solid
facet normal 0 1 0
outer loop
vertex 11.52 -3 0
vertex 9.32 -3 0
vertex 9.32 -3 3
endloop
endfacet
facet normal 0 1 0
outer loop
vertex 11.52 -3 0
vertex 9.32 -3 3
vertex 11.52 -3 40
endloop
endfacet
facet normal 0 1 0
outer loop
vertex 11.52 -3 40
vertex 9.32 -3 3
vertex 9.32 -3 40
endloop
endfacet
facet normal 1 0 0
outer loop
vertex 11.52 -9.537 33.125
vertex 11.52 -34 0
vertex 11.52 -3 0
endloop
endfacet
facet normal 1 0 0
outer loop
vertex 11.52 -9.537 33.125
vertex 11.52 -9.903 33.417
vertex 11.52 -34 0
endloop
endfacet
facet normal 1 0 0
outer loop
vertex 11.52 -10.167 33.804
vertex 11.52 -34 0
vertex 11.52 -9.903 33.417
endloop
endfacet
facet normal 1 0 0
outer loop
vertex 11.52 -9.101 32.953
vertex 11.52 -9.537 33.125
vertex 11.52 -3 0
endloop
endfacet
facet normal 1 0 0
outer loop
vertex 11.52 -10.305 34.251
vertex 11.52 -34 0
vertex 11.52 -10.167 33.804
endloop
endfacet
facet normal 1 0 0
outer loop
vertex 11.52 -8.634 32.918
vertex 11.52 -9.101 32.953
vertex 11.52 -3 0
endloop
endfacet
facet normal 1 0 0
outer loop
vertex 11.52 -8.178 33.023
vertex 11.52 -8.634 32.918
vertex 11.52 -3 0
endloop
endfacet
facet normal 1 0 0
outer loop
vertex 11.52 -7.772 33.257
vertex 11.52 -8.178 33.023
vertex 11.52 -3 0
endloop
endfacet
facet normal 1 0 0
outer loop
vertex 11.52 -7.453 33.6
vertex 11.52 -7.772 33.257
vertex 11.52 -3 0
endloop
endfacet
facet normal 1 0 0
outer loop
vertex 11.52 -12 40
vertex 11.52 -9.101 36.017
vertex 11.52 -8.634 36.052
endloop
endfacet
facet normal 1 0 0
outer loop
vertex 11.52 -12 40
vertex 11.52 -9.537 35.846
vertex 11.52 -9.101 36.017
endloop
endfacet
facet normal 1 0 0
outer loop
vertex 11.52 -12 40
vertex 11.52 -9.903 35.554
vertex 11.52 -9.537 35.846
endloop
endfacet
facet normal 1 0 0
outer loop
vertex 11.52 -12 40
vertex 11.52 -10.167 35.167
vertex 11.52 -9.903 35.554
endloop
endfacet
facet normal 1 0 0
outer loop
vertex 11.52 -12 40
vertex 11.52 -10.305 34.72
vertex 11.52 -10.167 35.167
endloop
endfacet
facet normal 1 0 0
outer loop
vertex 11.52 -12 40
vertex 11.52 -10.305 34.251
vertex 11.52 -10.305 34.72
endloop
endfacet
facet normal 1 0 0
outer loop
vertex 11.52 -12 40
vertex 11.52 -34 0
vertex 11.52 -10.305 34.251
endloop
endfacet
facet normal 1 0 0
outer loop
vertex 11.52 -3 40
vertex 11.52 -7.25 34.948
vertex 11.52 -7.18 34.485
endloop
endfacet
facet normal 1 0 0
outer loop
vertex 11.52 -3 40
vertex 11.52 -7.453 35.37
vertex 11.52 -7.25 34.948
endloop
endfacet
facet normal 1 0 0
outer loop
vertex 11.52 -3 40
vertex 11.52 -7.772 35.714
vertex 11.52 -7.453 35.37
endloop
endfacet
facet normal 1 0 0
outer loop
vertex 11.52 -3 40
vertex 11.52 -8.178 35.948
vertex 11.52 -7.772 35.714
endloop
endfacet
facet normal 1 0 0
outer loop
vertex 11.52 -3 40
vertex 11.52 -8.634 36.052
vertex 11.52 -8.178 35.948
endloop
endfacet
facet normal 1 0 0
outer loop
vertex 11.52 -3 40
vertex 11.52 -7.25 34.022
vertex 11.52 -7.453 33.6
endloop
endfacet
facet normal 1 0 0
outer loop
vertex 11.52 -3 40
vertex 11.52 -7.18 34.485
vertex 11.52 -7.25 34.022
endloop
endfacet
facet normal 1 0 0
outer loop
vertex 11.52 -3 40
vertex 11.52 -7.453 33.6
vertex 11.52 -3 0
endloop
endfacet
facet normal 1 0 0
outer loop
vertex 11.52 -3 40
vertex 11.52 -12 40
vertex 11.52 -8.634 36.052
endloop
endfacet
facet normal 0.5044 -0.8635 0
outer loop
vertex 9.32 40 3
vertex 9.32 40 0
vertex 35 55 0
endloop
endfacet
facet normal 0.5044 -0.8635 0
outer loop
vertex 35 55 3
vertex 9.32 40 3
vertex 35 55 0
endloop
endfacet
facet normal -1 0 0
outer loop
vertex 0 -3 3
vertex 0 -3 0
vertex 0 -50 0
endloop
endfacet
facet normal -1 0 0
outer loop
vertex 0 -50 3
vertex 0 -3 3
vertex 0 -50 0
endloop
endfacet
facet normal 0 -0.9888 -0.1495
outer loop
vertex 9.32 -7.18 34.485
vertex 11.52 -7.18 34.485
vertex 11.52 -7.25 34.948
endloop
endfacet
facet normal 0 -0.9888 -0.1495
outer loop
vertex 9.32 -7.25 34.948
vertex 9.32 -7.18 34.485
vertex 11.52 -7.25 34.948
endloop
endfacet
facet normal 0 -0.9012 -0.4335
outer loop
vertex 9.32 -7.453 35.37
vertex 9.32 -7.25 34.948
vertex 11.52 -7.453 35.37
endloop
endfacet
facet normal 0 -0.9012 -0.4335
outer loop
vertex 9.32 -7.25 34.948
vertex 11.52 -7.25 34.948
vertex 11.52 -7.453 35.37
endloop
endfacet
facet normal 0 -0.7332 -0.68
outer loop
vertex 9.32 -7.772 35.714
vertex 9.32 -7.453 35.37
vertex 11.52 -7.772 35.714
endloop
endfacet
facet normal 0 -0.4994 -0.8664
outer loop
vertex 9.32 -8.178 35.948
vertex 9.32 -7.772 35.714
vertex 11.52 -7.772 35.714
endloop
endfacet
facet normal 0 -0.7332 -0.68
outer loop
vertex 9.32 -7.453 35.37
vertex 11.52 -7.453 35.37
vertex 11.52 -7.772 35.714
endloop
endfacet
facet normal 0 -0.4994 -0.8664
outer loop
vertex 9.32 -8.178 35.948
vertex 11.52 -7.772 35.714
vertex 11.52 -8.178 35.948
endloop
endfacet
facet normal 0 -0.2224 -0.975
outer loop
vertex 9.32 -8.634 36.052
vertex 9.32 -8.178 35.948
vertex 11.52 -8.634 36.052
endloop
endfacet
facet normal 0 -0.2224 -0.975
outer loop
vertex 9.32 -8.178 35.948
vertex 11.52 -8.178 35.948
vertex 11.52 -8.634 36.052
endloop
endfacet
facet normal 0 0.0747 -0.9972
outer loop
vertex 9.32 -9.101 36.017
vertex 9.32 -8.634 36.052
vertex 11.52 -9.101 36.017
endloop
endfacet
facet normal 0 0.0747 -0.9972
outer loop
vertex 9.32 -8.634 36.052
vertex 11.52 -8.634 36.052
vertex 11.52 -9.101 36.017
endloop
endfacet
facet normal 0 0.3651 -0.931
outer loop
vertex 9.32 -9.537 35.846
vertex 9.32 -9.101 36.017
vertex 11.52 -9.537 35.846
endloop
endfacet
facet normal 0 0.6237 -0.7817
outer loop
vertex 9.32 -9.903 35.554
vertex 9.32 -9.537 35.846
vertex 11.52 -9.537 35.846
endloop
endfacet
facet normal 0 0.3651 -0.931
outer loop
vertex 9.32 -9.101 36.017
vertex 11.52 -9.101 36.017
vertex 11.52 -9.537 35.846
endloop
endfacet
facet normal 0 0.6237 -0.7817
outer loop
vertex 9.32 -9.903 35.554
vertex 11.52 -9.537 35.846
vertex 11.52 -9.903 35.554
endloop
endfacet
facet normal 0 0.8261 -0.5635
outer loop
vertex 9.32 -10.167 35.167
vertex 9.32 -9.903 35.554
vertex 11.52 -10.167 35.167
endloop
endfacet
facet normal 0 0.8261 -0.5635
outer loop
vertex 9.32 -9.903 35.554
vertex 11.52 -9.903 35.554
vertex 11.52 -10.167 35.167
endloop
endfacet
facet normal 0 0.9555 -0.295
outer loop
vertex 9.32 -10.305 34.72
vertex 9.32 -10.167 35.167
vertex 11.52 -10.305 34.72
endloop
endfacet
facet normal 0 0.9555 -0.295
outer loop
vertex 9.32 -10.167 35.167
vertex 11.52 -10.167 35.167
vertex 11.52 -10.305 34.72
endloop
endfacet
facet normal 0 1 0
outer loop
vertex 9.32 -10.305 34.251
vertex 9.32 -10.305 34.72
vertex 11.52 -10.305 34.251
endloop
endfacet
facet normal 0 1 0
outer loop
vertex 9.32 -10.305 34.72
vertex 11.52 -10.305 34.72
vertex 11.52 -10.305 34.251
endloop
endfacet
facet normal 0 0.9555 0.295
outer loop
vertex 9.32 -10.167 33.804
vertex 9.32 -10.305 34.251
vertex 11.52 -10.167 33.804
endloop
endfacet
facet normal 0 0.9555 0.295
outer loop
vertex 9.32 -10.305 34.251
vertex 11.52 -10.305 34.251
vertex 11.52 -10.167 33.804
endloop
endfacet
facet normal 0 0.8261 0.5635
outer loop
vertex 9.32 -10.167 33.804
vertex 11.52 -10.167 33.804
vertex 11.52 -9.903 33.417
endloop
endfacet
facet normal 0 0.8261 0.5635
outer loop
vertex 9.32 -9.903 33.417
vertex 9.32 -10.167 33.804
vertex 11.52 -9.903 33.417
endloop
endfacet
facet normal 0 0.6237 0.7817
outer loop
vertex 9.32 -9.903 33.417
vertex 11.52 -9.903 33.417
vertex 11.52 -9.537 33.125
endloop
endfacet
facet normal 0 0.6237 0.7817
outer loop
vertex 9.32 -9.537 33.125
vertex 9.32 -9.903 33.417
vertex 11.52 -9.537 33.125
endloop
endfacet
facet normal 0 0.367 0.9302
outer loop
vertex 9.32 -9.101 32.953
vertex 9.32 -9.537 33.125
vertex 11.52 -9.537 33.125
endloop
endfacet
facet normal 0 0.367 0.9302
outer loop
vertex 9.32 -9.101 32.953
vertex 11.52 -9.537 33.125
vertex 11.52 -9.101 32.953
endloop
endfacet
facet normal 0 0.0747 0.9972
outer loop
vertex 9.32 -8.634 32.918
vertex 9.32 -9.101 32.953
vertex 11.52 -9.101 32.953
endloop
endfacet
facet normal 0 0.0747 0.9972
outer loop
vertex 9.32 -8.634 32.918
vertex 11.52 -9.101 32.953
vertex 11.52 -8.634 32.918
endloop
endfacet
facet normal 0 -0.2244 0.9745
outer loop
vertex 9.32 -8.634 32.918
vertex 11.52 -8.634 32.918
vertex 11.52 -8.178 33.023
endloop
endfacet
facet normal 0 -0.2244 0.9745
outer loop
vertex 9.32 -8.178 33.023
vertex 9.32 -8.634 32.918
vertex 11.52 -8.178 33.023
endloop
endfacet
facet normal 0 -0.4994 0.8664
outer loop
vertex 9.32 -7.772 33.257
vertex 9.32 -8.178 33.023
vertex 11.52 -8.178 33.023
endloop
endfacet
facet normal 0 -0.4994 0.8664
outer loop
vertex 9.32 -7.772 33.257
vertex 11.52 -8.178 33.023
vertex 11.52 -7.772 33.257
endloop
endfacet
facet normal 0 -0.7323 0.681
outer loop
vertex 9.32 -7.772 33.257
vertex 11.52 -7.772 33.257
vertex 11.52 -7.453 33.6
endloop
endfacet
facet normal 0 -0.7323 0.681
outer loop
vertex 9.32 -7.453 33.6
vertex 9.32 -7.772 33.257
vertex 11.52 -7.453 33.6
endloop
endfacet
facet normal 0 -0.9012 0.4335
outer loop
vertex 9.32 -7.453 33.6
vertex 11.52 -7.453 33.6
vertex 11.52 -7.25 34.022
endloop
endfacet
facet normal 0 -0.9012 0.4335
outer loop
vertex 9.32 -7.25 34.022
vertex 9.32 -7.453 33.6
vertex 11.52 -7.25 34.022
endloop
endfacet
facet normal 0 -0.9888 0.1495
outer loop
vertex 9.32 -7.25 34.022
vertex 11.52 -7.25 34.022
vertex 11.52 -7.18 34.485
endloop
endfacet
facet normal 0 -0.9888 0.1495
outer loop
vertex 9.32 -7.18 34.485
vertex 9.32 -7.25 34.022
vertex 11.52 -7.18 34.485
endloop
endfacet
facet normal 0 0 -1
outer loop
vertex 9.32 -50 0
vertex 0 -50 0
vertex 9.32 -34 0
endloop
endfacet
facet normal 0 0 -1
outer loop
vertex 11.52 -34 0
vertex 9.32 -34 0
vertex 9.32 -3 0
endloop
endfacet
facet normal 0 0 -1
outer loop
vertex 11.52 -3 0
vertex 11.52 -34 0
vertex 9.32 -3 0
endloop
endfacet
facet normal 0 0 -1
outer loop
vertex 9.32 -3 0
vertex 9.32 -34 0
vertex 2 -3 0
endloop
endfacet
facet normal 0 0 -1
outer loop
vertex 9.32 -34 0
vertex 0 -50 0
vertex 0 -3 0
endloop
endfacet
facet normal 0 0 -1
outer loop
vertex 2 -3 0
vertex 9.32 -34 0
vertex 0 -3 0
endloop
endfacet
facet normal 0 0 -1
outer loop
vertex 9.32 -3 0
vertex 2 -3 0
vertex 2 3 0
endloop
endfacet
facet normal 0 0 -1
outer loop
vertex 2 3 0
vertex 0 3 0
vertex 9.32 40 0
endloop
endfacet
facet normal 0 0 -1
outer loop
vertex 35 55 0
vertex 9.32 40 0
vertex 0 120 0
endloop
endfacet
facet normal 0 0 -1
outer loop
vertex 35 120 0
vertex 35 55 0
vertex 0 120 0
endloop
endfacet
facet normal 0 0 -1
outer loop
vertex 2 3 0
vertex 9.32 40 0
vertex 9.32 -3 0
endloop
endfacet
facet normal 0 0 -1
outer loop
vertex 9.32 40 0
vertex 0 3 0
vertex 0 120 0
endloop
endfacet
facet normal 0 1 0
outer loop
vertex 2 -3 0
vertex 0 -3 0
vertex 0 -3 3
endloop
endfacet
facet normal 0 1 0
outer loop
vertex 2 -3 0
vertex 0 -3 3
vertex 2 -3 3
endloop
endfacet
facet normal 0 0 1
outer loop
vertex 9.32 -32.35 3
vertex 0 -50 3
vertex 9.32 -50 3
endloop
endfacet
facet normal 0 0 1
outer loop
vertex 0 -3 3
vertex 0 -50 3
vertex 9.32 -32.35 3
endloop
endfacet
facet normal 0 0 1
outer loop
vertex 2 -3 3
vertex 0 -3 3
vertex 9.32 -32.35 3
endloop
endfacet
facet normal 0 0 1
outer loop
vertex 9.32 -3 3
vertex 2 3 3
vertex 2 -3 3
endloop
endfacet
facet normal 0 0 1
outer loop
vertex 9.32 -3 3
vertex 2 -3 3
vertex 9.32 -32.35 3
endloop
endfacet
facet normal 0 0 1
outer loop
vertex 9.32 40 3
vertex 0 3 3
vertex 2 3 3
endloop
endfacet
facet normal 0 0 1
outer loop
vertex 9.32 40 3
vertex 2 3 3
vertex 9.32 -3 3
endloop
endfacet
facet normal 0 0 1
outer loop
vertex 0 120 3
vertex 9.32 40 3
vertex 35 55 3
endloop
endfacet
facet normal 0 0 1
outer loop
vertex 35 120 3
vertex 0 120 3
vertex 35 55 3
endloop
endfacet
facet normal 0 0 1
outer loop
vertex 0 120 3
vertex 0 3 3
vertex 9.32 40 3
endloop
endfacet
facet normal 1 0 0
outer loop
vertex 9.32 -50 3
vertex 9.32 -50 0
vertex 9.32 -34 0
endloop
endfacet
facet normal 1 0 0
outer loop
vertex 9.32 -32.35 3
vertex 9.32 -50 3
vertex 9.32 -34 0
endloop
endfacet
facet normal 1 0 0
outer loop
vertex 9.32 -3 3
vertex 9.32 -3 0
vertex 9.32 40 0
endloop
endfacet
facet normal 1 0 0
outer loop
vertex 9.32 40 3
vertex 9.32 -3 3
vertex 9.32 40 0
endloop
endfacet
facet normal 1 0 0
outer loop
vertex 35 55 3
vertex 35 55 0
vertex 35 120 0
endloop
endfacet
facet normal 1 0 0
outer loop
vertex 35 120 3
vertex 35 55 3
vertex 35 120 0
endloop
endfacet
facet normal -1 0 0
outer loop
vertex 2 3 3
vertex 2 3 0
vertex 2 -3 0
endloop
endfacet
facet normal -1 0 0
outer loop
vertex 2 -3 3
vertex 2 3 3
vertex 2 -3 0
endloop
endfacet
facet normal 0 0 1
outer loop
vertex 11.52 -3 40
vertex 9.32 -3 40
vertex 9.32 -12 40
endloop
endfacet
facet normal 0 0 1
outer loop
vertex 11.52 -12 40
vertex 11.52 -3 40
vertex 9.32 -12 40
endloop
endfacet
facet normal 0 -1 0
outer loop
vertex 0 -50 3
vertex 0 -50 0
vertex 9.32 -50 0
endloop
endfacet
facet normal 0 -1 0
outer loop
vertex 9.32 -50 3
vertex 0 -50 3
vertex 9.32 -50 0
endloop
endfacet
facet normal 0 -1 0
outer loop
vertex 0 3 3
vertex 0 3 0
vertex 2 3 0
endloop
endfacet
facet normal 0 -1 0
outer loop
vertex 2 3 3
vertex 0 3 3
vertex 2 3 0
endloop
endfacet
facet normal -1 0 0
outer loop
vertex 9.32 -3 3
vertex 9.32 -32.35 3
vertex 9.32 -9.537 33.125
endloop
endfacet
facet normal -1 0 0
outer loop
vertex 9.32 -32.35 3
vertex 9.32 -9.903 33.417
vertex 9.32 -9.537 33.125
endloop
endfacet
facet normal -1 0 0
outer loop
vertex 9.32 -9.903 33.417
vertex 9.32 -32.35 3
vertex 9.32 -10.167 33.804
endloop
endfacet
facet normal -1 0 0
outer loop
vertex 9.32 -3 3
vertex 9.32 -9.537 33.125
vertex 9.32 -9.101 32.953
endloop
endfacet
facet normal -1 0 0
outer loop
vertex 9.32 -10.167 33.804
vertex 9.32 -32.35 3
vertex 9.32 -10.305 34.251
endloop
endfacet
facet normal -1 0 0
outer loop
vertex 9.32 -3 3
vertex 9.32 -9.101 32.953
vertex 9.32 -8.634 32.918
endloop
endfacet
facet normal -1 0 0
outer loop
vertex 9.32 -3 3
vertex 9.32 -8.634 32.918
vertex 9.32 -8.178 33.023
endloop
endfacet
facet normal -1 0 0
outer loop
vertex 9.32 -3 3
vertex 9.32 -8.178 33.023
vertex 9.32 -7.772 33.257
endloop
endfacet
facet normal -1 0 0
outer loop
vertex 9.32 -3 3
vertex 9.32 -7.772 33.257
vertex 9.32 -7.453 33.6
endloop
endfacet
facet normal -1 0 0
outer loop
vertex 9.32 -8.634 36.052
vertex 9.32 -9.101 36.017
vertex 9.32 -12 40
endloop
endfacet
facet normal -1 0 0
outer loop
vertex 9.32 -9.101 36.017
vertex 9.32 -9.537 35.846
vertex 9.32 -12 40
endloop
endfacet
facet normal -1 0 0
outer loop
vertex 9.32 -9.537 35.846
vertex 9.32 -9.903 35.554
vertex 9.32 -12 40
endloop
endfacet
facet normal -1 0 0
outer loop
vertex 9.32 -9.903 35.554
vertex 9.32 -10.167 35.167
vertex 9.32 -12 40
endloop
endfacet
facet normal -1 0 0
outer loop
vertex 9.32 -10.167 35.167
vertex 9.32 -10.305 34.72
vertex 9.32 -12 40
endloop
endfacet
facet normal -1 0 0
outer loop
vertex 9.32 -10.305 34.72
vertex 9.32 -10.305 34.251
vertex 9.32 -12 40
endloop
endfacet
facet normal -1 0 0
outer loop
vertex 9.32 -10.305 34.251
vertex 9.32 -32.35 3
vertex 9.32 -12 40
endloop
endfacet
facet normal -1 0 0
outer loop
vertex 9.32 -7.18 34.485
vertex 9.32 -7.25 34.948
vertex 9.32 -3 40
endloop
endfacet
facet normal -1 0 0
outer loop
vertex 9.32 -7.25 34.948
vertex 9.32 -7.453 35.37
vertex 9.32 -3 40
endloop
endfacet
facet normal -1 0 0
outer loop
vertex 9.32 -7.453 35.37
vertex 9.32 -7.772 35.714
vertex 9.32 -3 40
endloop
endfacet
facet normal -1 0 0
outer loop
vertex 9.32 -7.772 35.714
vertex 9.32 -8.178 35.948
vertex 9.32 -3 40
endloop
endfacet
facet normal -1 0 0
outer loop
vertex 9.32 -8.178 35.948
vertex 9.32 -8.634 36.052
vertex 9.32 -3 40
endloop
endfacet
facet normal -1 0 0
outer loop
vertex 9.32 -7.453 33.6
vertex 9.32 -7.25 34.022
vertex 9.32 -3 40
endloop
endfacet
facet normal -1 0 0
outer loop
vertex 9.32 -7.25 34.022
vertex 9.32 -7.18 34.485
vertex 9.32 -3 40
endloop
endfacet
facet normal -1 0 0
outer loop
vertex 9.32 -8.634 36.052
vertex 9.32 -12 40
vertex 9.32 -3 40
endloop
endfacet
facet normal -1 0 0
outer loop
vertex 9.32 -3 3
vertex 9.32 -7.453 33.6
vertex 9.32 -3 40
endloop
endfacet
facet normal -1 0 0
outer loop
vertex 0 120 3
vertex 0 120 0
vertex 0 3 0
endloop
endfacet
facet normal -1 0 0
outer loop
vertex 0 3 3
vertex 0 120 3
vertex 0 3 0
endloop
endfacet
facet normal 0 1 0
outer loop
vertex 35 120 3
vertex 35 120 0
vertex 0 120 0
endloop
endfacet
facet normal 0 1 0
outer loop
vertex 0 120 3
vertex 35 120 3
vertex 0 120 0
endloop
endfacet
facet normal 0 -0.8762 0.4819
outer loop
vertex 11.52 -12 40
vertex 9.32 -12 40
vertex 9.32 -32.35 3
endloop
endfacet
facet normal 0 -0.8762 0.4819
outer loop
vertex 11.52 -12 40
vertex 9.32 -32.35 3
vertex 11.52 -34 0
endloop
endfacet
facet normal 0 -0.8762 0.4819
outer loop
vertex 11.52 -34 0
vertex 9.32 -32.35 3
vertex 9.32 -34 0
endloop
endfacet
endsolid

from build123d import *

# Parameters (mm, degrees)
PAD_DEPTH       = 3
SKETCH001_W     = 2
SKETCH001_H     = 6
POCKET_DEPTH    = 5
PAD001_DEPTH    = 2.2
SKETCH003_R     = 1.571244
POCKET001_DEPTH = 5


with BuildPart() as part:
    # Sketch → Pad (new body)
    with BuildSketch(Plane.XY):
        Polygon((0, -50), (9.32, -50), (9.32, 40), (35, 55), (35, 120), (0, 120), align=None)
    extrude(amount=PAD_DEPTH)

    # Sketch001 (on Face7 of Pad) → Pocket (cut)
    with BuildSketch(Plane(origin=(0, 0, 0), x_dir=(1, 0, 0), z_dir=(0, 0, -1))):
        with Locations((1, 0)):
            Rectangle(SKETCH001_W, SKETCH001_H)
    extrude(amount=-POCKET_DEPTH, mode=Mode.SUBTRACT)

    # Sketch002 (on Face3 of Pocket) → Pad001 (join)
    with BuildSketch(Plane.YZ.offset(9.32)):
        Polygon((-3, 0), (-3, 40), (-12, 40), (-34, 0), align=None)
    extrude(amount=PAD001_DEPTH)

    # Sketch003 (on Face18 of Pad001) → Pocket001 (cut)
    with BuildSketch(Plane.YZ.offset(11.52)):
        with Locations((-8.751605, 34.485332)):
            Circle(SKETCH003_R)
    extrude(amount=-POCKET001_DEPTH, mode=Mode.SUBTRACT)


solid = part.part
